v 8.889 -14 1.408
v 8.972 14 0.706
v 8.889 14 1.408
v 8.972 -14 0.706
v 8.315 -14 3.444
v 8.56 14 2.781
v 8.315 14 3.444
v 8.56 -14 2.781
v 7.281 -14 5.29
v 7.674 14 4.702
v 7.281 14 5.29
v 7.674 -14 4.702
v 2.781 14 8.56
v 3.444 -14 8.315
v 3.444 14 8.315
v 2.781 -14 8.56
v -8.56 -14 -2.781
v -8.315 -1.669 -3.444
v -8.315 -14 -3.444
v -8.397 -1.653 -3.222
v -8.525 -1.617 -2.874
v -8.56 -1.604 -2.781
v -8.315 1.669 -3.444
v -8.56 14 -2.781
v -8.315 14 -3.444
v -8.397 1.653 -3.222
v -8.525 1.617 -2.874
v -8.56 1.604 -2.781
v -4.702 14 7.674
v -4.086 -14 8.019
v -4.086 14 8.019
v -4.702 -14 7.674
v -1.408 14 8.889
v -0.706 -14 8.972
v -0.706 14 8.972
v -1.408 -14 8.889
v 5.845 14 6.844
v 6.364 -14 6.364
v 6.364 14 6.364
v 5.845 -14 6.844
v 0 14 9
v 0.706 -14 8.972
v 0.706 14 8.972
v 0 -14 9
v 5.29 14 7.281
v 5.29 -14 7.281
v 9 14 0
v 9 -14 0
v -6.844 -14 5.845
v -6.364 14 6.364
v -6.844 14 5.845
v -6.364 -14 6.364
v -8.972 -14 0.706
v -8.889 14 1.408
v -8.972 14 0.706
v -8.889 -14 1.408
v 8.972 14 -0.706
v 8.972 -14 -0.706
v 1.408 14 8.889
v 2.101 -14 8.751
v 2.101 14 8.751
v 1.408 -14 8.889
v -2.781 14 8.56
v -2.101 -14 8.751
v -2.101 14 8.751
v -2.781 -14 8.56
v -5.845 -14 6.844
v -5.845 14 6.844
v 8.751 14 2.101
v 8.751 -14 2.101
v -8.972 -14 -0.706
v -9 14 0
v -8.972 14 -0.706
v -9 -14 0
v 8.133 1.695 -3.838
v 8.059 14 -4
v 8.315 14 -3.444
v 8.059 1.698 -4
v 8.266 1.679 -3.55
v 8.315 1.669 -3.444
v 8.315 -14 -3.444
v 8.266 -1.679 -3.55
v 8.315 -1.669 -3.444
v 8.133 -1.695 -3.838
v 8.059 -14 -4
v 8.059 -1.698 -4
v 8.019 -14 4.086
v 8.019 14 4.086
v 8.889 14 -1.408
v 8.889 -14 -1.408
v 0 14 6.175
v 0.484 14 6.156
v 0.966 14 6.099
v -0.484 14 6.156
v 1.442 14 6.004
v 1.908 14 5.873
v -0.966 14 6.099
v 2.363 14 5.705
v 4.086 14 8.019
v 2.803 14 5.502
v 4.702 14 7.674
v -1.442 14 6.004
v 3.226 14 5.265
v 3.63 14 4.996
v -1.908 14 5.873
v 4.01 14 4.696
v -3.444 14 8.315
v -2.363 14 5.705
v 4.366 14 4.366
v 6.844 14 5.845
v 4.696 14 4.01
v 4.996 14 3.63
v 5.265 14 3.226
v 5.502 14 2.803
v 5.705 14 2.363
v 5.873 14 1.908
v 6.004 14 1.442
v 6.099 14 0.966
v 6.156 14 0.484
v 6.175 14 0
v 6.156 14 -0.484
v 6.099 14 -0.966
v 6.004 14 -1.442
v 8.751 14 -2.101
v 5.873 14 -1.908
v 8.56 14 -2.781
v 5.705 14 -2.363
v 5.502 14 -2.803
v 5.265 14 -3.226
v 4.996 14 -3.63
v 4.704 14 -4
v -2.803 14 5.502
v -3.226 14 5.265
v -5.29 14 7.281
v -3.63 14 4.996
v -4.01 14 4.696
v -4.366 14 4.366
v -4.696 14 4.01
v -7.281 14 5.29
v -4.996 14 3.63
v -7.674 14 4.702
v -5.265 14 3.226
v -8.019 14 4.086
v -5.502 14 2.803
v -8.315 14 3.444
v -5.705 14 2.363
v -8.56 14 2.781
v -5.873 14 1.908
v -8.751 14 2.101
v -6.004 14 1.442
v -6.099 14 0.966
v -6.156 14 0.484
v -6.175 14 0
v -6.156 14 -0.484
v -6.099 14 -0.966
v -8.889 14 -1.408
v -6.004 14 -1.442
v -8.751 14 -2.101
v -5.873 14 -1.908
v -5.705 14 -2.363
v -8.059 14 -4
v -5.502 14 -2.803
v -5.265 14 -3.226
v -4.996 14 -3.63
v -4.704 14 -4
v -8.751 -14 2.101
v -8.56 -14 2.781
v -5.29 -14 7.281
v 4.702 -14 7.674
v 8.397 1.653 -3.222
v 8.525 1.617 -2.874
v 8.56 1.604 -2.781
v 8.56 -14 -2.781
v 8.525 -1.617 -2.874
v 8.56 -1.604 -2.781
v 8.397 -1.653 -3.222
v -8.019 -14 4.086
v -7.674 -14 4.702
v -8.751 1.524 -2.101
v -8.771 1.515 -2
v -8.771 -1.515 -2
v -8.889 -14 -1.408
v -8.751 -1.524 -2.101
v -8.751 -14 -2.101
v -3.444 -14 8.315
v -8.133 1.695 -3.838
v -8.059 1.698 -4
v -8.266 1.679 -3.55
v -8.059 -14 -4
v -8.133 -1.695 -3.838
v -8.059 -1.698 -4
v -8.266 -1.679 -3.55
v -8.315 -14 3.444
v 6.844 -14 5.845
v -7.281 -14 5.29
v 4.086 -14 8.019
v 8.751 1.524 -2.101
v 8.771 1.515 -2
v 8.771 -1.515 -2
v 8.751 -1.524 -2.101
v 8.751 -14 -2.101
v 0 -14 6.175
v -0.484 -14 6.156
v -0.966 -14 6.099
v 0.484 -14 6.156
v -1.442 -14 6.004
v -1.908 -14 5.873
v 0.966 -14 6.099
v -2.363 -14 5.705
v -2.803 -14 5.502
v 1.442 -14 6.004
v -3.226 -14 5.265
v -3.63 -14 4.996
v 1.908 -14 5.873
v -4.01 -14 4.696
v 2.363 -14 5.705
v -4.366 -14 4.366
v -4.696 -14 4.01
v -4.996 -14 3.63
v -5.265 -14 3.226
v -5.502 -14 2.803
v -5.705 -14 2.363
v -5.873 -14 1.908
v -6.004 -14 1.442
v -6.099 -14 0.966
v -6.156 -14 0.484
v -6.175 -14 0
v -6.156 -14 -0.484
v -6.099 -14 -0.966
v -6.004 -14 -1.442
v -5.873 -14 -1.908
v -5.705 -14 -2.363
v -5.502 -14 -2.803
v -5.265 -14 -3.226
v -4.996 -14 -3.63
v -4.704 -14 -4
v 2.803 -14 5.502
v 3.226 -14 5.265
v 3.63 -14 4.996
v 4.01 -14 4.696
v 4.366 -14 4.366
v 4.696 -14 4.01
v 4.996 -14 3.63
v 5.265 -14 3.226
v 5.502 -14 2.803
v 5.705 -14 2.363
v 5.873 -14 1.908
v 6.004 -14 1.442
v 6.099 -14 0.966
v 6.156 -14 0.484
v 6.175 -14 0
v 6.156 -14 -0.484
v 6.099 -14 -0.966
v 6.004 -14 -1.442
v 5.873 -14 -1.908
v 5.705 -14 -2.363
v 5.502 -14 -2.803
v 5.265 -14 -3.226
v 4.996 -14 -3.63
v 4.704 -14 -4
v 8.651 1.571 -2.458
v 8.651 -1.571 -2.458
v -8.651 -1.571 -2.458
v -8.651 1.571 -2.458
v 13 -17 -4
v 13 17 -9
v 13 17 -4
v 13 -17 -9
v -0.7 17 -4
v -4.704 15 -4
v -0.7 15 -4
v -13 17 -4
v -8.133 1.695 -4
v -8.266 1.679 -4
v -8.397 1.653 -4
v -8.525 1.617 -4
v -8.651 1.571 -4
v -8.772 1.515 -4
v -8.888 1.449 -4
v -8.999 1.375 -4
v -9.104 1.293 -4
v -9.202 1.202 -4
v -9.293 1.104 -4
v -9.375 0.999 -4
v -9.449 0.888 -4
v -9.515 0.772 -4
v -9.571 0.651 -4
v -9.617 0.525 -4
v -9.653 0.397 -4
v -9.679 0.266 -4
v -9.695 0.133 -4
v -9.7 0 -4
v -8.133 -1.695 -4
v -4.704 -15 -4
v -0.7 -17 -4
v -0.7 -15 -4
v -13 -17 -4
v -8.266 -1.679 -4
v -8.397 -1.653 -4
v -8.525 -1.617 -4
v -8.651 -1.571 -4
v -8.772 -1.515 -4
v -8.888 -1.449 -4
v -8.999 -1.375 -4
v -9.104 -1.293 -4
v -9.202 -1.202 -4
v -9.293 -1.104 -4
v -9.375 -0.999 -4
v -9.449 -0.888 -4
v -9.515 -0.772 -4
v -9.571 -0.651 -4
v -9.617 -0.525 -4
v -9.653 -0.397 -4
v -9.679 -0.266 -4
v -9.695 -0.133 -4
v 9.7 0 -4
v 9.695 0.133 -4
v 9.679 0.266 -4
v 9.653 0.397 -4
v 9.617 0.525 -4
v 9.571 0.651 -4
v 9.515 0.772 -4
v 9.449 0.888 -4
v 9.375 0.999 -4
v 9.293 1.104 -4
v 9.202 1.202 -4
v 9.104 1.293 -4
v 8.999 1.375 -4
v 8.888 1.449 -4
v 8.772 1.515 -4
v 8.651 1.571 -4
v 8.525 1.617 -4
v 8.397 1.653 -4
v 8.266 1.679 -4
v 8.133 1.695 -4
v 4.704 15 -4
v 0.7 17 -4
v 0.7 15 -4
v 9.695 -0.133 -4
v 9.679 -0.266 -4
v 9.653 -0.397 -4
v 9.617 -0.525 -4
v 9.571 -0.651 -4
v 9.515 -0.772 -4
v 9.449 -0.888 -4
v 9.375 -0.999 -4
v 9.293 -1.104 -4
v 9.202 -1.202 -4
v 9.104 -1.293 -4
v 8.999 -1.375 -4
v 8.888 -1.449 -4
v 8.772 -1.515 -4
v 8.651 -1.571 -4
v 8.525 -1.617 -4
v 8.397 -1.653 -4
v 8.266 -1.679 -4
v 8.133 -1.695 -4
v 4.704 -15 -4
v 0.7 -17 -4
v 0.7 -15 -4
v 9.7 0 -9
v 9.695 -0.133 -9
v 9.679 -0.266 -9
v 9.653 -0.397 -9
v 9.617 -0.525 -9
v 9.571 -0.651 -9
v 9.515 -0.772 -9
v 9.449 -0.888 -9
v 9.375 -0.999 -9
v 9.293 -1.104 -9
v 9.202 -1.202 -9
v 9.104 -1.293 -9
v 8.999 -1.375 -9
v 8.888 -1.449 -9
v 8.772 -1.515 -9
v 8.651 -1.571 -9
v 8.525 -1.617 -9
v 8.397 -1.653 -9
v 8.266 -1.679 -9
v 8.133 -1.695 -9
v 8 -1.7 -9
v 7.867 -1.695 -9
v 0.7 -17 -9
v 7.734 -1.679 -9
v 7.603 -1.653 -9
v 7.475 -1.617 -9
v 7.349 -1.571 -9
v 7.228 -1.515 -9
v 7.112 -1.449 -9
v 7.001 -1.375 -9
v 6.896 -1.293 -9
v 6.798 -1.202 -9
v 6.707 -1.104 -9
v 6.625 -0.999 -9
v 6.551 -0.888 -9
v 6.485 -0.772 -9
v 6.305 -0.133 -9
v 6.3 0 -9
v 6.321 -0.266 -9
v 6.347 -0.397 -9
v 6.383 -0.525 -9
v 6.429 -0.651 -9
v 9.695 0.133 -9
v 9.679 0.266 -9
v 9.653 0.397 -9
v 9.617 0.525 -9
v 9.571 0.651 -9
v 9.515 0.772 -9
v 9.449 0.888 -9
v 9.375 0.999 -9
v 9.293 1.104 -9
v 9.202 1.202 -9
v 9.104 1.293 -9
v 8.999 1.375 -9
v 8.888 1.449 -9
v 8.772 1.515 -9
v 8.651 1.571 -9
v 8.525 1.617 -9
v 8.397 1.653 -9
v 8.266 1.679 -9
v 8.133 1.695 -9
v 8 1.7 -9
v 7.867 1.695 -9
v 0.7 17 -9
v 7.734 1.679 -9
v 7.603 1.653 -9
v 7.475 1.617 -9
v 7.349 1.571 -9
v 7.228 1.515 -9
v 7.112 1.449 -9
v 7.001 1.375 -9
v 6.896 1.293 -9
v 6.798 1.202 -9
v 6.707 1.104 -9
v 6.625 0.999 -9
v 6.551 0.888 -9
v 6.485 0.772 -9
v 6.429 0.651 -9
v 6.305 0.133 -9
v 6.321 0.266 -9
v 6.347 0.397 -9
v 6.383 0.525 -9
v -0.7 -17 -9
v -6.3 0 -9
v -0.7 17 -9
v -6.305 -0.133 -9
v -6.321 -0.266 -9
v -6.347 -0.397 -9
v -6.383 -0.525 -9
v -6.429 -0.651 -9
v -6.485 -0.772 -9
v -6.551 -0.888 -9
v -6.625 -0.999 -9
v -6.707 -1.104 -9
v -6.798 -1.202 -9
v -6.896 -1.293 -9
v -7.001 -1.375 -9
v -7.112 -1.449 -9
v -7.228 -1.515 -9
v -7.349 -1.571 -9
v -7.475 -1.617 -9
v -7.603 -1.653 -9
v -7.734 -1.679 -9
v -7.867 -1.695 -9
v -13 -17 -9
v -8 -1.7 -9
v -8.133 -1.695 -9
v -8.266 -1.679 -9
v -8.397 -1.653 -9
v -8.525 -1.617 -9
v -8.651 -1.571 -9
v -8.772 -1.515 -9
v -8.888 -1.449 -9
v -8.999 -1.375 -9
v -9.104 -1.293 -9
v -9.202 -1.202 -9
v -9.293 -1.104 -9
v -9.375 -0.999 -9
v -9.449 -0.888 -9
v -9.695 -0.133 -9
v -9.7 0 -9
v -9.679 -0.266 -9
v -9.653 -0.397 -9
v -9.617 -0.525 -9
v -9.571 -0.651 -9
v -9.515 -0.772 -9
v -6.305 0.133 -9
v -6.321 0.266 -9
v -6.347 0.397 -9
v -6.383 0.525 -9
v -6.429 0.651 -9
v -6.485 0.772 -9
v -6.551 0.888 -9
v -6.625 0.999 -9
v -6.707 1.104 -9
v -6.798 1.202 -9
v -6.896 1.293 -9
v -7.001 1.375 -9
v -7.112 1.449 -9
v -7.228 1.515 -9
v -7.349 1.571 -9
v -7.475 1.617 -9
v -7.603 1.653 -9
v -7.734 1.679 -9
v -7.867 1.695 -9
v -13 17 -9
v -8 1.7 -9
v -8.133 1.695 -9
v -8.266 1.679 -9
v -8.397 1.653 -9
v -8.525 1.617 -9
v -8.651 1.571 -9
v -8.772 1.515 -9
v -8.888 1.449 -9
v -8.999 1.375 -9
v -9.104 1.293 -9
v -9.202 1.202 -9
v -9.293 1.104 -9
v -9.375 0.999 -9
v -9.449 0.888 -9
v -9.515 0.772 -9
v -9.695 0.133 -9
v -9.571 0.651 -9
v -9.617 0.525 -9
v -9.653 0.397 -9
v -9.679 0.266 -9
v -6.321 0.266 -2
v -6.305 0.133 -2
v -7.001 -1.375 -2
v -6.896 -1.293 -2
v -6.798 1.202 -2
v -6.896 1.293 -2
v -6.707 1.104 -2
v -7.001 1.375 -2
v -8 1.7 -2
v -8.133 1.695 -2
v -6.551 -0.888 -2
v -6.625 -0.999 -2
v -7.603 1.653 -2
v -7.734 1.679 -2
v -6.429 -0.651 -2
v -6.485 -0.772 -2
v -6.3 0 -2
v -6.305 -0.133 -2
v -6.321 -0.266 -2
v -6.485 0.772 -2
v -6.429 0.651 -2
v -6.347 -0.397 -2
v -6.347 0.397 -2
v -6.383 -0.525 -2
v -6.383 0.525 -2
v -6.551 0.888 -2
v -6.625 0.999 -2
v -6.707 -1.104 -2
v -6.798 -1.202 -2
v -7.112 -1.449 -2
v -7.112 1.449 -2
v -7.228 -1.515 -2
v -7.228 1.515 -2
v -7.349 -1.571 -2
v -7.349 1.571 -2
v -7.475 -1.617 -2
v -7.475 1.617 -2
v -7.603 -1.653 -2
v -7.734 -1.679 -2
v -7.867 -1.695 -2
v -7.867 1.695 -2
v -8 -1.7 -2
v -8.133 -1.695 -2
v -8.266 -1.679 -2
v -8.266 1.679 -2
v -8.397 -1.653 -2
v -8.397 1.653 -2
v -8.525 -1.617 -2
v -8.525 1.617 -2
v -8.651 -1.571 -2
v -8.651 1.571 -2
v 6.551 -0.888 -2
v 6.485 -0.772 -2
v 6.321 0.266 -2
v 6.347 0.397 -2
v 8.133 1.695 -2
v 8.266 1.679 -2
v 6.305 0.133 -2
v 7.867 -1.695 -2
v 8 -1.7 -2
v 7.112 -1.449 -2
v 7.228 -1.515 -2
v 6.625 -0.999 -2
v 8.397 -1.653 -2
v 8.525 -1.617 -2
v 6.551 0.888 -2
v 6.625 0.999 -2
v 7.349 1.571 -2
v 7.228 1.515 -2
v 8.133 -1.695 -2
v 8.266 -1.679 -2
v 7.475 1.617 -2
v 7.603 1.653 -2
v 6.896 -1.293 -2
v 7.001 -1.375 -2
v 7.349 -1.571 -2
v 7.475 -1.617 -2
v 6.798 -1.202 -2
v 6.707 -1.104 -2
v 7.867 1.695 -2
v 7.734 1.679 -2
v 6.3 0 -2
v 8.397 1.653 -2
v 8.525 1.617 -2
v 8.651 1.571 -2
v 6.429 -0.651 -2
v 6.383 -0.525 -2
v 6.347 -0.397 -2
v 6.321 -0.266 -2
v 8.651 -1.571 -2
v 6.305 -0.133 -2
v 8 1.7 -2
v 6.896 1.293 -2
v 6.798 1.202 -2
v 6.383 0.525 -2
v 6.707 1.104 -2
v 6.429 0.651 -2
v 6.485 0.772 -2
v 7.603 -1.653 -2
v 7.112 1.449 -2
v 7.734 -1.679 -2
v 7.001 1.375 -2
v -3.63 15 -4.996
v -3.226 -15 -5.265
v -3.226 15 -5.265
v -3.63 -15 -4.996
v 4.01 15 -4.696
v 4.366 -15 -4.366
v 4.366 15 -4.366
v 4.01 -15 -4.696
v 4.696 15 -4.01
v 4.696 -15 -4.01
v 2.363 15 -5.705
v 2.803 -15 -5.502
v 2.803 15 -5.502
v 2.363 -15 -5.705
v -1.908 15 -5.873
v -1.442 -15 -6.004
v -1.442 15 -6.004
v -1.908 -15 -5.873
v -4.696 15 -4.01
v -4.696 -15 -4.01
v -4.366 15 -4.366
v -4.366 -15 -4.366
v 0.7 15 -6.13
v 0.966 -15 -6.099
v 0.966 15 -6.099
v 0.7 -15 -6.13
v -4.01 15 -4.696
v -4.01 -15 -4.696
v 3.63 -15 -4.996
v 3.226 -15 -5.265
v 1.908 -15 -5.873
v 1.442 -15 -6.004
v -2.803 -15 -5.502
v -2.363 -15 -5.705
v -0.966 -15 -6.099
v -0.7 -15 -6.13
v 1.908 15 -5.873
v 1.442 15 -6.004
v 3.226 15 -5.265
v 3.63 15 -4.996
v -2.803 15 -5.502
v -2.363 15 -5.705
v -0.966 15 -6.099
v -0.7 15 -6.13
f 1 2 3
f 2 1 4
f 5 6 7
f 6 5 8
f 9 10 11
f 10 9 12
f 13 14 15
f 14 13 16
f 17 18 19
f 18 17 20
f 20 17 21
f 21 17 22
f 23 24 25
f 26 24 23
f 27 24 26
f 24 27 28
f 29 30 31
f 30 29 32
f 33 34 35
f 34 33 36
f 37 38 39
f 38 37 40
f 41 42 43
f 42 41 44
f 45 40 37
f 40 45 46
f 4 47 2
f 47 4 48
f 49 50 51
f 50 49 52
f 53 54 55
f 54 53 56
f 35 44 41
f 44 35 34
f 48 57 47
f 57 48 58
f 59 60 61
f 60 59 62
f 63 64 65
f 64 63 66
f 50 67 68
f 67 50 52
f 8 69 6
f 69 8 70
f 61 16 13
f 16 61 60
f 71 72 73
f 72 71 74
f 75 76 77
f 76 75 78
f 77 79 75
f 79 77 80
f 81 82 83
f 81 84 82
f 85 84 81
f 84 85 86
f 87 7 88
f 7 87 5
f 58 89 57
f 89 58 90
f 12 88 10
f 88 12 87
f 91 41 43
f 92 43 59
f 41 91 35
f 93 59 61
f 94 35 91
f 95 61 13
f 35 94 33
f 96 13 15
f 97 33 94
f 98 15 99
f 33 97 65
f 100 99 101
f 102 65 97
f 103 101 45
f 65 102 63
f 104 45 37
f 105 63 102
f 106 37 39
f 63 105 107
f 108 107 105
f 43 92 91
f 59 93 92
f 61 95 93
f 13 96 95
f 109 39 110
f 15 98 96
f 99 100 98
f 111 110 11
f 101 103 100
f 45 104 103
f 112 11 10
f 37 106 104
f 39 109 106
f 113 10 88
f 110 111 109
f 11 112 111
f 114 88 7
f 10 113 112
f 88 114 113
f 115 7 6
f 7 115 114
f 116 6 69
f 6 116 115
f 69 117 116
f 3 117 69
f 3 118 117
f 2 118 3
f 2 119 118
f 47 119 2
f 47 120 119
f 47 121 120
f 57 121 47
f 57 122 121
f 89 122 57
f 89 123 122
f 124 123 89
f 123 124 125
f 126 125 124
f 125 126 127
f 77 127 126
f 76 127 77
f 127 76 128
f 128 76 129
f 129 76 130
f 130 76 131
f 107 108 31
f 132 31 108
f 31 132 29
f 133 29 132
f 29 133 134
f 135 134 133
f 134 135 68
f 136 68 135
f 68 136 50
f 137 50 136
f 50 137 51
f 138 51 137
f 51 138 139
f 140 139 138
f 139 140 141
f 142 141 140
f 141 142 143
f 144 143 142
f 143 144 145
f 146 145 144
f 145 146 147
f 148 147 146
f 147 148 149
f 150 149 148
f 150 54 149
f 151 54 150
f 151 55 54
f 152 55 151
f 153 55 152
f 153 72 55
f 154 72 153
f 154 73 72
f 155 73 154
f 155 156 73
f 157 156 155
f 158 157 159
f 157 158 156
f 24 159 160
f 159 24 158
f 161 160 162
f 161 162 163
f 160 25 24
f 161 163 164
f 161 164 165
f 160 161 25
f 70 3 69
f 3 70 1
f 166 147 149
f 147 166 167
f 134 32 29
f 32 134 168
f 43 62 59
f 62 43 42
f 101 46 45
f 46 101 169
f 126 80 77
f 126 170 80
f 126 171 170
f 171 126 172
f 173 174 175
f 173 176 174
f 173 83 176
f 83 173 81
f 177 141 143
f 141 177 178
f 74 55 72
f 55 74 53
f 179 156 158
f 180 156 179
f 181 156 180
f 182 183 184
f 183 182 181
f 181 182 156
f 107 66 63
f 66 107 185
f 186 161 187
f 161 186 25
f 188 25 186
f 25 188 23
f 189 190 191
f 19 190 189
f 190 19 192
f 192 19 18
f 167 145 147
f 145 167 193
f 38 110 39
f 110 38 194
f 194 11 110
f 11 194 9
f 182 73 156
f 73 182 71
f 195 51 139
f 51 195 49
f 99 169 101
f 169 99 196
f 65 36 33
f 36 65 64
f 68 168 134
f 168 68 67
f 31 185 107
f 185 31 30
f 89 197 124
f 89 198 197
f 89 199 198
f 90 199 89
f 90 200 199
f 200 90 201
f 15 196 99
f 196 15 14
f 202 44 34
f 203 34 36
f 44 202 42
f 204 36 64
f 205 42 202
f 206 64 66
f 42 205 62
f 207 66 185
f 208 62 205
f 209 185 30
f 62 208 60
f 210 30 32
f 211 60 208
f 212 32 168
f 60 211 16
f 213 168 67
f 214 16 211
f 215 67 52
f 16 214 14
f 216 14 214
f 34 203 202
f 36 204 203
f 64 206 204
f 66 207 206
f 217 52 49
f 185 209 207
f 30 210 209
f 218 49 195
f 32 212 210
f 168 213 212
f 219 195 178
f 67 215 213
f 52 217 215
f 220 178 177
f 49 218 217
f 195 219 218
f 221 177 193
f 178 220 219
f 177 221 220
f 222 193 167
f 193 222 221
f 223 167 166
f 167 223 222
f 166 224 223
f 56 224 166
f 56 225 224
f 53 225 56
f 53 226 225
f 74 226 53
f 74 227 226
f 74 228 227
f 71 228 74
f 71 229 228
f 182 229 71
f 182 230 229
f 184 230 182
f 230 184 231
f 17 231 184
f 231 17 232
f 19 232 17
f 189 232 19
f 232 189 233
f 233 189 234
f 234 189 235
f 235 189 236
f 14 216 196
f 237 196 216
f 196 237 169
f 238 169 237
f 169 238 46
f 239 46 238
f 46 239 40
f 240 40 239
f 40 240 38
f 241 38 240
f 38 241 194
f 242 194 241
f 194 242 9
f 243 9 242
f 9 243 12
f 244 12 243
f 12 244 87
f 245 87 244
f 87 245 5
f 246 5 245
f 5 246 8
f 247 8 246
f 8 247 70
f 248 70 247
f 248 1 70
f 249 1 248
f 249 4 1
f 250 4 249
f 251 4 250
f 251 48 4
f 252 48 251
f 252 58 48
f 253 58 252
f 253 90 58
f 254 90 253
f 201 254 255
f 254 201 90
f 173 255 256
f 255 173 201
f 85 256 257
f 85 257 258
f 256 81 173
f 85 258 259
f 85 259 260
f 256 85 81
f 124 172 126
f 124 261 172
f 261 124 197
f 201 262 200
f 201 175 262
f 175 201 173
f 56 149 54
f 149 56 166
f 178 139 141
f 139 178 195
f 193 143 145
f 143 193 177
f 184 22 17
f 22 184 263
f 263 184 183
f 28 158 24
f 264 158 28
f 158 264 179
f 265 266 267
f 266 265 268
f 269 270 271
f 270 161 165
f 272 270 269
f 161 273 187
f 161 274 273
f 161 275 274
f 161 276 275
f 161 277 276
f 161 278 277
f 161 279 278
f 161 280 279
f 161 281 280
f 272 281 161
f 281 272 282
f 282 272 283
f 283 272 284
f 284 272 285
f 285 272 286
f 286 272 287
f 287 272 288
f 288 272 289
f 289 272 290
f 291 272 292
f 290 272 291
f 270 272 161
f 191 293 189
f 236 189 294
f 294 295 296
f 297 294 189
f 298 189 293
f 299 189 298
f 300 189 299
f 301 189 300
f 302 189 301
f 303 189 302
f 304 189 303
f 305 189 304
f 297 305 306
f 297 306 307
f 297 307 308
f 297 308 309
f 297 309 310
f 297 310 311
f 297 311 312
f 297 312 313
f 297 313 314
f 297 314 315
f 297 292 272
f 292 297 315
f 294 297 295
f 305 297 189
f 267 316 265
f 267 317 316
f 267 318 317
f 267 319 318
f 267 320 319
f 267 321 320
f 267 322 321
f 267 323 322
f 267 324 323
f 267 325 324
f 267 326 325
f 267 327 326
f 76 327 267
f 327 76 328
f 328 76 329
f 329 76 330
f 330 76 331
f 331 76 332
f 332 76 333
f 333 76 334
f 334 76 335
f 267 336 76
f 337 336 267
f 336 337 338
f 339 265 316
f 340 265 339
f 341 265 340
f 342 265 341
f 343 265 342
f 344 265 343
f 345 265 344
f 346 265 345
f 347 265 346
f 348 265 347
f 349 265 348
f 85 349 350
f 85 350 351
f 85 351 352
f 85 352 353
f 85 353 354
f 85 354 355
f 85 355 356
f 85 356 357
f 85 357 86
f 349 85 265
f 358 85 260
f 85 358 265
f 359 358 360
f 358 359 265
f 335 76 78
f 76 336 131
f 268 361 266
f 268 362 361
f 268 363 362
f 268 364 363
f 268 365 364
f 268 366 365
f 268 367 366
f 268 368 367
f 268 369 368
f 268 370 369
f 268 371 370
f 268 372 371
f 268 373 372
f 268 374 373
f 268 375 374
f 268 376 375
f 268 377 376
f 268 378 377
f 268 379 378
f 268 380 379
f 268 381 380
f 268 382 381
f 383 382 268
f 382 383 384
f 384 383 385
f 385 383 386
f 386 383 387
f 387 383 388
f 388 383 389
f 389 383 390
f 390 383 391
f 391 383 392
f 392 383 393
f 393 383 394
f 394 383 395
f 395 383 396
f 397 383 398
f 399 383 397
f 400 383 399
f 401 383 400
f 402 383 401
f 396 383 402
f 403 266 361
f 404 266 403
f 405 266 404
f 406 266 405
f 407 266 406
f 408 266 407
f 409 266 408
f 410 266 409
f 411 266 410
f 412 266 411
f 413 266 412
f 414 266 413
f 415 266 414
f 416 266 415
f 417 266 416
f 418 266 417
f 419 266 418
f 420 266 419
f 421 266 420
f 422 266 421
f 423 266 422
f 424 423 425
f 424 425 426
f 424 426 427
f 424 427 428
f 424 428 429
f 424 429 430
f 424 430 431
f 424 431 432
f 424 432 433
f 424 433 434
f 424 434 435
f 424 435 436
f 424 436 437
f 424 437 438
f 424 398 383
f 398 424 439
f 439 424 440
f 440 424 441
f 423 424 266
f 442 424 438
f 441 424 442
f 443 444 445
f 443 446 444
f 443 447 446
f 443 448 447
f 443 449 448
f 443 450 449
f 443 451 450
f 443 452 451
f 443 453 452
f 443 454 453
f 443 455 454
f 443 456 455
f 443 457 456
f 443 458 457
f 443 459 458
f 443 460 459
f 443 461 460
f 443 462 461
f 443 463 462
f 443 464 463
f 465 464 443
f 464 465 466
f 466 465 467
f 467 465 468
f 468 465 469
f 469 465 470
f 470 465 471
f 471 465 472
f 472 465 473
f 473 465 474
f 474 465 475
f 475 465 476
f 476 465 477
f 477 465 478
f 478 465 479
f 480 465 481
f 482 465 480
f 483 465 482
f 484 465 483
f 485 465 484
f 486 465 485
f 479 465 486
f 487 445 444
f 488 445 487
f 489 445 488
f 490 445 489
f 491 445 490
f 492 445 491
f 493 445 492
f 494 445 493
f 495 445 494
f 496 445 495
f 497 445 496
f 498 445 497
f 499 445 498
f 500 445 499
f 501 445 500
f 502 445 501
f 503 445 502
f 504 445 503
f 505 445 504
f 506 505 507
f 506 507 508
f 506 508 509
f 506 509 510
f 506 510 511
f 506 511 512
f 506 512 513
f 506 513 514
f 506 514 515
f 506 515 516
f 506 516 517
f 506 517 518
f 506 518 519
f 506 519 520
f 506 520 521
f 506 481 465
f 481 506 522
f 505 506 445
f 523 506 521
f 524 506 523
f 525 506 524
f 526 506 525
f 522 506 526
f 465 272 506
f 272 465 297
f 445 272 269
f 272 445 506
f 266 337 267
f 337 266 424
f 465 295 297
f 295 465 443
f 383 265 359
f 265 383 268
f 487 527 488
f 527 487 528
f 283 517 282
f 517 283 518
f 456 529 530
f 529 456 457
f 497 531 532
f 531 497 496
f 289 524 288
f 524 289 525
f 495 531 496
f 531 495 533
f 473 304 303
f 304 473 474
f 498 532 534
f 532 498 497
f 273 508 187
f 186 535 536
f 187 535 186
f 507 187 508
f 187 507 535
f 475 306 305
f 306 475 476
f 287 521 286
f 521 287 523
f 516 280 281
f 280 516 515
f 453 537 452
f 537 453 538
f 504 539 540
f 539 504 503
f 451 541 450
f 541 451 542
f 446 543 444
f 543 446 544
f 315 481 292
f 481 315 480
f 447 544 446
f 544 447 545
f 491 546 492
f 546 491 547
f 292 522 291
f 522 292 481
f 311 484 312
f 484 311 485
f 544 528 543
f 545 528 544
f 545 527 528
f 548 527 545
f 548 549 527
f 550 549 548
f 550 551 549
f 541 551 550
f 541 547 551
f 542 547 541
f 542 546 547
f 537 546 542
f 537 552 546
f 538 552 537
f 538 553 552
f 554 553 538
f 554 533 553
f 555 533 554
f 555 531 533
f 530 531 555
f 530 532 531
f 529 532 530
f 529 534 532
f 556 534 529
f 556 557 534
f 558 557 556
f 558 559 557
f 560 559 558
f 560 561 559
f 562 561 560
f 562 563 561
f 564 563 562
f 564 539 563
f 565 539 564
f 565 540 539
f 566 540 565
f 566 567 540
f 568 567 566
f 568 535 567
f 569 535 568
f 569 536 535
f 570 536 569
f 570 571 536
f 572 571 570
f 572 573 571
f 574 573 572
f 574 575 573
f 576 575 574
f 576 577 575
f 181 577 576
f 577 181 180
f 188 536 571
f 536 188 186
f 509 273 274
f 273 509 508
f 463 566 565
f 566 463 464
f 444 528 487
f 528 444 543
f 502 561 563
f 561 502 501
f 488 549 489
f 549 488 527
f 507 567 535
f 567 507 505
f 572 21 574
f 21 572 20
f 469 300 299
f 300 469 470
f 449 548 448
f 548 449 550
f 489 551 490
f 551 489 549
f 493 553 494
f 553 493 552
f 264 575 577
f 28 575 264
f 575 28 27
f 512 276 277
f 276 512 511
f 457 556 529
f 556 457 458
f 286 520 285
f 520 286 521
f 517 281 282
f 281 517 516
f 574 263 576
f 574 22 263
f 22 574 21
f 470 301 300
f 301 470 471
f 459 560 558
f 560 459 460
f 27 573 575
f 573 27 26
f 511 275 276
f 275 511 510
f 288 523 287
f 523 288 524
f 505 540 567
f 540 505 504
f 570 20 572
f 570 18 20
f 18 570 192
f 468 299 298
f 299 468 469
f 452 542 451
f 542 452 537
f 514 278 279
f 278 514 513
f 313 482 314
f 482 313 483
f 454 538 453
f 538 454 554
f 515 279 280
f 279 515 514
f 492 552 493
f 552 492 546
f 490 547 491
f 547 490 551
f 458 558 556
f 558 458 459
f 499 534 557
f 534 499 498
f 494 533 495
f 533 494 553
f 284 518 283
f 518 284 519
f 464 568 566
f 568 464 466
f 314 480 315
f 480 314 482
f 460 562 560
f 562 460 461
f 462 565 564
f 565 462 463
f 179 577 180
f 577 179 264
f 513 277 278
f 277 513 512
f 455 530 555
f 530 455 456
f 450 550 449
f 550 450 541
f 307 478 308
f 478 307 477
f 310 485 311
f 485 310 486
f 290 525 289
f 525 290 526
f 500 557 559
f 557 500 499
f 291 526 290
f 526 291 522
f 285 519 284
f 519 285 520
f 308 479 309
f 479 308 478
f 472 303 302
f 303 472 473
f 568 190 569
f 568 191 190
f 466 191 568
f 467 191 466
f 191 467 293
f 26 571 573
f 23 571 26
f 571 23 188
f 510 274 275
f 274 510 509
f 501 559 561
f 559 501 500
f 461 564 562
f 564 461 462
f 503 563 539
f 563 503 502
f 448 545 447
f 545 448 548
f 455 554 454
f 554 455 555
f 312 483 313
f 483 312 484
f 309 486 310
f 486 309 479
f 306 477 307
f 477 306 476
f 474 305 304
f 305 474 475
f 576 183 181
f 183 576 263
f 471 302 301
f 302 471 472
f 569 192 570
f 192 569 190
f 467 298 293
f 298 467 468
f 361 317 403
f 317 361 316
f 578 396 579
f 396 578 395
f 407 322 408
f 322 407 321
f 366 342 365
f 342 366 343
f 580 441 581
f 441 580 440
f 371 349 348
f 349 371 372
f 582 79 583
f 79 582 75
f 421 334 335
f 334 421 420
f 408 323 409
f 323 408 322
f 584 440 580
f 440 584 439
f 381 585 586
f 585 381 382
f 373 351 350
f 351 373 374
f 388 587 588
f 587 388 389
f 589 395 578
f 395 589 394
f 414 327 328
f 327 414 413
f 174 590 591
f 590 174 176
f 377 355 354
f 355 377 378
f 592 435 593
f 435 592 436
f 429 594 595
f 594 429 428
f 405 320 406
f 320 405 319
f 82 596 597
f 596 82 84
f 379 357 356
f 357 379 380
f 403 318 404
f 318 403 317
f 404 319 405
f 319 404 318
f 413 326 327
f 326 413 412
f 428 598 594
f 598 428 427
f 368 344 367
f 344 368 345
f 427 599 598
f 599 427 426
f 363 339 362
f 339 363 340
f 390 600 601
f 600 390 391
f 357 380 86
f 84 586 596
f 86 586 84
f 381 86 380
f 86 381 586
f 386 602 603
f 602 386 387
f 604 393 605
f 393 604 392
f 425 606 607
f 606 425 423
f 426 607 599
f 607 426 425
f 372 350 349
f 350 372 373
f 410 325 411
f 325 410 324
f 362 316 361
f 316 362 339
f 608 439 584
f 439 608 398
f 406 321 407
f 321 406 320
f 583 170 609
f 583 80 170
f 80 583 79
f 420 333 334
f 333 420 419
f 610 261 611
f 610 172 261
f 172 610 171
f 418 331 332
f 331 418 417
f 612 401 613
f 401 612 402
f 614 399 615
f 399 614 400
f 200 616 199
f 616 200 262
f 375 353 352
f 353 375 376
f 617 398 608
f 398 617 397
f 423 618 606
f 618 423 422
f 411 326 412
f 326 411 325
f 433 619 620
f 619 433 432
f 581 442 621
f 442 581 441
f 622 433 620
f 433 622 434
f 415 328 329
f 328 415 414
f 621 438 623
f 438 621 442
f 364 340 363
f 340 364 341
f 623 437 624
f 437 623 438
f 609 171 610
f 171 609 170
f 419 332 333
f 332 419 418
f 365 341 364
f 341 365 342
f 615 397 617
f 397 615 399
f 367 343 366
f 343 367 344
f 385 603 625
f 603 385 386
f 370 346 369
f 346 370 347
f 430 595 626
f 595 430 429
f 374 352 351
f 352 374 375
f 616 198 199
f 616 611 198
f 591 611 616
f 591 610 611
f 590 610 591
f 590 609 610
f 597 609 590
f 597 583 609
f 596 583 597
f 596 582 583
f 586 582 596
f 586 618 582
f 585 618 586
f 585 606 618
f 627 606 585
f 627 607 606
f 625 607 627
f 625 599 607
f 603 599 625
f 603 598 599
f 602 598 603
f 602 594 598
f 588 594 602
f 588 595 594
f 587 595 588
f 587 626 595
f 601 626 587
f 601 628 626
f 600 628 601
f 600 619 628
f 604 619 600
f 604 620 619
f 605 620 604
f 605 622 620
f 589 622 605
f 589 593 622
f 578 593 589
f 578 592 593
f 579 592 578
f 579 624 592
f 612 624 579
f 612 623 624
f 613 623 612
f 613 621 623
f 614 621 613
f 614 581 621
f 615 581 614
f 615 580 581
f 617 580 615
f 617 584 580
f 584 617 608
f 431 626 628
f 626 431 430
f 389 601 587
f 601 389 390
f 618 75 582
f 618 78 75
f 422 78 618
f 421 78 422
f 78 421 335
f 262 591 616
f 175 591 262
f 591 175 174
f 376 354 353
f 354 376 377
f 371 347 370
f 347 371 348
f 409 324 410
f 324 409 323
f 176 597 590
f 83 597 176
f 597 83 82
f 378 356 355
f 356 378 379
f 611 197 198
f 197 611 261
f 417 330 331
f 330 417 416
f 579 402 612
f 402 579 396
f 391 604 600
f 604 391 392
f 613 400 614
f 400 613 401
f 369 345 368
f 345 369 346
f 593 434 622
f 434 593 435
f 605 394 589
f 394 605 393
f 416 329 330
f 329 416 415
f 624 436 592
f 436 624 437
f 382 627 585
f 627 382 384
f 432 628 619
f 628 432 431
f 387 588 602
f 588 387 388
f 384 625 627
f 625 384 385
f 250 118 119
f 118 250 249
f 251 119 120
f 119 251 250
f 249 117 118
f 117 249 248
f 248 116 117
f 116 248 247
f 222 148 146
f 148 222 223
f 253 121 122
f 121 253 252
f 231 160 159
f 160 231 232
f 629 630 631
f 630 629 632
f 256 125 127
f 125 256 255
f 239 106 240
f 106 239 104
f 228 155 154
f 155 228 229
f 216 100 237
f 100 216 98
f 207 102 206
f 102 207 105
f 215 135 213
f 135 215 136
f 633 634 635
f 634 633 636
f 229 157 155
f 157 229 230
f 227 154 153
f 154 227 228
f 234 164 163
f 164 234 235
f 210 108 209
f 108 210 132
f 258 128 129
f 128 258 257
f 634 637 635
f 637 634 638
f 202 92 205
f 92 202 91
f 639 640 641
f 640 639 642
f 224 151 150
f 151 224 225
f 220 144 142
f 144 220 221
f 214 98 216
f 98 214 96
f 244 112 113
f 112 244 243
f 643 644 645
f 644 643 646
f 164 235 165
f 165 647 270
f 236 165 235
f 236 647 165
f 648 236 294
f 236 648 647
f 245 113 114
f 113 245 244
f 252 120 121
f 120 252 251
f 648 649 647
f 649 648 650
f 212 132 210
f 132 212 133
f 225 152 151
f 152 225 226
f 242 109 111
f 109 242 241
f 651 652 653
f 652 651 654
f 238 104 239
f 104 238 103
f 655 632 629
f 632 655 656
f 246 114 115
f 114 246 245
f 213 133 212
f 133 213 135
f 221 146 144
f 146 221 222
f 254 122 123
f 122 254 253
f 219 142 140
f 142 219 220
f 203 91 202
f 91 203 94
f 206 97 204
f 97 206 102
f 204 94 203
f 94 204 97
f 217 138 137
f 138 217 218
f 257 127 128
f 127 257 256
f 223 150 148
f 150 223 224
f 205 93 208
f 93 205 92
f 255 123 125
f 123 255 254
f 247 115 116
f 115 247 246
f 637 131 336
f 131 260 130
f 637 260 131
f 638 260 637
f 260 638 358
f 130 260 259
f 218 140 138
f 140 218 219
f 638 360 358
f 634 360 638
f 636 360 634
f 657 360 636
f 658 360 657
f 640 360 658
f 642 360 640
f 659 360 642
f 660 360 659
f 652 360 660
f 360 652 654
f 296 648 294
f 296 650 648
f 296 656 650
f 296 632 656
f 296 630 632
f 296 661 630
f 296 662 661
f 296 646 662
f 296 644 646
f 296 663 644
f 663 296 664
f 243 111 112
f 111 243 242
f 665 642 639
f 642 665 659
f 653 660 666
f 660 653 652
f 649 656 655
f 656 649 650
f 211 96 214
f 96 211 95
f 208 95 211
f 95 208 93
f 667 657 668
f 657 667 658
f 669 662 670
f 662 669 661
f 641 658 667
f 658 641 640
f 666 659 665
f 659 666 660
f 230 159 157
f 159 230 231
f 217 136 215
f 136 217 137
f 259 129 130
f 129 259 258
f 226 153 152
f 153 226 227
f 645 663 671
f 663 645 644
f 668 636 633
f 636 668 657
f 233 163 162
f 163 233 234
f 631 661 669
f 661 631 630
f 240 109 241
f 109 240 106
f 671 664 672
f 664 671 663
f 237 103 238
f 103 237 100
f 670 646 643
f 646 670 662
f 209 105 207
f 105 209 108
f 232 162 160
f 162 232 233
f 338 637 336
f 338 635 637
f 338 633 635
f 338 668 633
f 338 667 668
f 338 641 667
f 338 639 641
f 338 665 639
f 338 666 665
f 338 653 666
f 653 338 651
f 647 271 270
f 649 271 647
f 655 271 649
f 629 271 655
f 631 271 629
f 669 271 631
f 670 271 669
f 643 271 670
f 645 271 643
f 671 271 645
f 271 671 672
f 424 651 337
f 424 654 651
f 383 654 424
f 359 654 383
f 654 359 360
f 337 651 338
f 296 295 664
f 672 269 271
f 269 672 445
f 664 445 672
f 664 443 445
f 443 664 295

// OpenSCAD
// Parametric clamp for a low-power cylindrical laser module.
laser_d = 12.0;
clearance = 0.35;
wall = 3.0;
length = 28.0;
base_w = 26.0;
base_l = 34.0;
mount_hole_d = 3.4;
$fn = 80;

difference() {
  union() {
    rotate([90,0,0]) cylinder(h=length, d=laser_d + 2*wall, center=true);
    translate([-base_w/2,-base_l/2,-laser_d/2-wall]) cube([base_w,base_l,5]);
  }
  rotate([90,0,0]) cylinder(h=length+2, d=laser_d+clearance, center=true);
  translate([0,0,-20]) cube([1.4,40,40], center=true);
  for (x=[-8,8]) translate([x,0,-laser_d/2-wall-1]) cylinder(h=8,d=mount_hole_d);
}
